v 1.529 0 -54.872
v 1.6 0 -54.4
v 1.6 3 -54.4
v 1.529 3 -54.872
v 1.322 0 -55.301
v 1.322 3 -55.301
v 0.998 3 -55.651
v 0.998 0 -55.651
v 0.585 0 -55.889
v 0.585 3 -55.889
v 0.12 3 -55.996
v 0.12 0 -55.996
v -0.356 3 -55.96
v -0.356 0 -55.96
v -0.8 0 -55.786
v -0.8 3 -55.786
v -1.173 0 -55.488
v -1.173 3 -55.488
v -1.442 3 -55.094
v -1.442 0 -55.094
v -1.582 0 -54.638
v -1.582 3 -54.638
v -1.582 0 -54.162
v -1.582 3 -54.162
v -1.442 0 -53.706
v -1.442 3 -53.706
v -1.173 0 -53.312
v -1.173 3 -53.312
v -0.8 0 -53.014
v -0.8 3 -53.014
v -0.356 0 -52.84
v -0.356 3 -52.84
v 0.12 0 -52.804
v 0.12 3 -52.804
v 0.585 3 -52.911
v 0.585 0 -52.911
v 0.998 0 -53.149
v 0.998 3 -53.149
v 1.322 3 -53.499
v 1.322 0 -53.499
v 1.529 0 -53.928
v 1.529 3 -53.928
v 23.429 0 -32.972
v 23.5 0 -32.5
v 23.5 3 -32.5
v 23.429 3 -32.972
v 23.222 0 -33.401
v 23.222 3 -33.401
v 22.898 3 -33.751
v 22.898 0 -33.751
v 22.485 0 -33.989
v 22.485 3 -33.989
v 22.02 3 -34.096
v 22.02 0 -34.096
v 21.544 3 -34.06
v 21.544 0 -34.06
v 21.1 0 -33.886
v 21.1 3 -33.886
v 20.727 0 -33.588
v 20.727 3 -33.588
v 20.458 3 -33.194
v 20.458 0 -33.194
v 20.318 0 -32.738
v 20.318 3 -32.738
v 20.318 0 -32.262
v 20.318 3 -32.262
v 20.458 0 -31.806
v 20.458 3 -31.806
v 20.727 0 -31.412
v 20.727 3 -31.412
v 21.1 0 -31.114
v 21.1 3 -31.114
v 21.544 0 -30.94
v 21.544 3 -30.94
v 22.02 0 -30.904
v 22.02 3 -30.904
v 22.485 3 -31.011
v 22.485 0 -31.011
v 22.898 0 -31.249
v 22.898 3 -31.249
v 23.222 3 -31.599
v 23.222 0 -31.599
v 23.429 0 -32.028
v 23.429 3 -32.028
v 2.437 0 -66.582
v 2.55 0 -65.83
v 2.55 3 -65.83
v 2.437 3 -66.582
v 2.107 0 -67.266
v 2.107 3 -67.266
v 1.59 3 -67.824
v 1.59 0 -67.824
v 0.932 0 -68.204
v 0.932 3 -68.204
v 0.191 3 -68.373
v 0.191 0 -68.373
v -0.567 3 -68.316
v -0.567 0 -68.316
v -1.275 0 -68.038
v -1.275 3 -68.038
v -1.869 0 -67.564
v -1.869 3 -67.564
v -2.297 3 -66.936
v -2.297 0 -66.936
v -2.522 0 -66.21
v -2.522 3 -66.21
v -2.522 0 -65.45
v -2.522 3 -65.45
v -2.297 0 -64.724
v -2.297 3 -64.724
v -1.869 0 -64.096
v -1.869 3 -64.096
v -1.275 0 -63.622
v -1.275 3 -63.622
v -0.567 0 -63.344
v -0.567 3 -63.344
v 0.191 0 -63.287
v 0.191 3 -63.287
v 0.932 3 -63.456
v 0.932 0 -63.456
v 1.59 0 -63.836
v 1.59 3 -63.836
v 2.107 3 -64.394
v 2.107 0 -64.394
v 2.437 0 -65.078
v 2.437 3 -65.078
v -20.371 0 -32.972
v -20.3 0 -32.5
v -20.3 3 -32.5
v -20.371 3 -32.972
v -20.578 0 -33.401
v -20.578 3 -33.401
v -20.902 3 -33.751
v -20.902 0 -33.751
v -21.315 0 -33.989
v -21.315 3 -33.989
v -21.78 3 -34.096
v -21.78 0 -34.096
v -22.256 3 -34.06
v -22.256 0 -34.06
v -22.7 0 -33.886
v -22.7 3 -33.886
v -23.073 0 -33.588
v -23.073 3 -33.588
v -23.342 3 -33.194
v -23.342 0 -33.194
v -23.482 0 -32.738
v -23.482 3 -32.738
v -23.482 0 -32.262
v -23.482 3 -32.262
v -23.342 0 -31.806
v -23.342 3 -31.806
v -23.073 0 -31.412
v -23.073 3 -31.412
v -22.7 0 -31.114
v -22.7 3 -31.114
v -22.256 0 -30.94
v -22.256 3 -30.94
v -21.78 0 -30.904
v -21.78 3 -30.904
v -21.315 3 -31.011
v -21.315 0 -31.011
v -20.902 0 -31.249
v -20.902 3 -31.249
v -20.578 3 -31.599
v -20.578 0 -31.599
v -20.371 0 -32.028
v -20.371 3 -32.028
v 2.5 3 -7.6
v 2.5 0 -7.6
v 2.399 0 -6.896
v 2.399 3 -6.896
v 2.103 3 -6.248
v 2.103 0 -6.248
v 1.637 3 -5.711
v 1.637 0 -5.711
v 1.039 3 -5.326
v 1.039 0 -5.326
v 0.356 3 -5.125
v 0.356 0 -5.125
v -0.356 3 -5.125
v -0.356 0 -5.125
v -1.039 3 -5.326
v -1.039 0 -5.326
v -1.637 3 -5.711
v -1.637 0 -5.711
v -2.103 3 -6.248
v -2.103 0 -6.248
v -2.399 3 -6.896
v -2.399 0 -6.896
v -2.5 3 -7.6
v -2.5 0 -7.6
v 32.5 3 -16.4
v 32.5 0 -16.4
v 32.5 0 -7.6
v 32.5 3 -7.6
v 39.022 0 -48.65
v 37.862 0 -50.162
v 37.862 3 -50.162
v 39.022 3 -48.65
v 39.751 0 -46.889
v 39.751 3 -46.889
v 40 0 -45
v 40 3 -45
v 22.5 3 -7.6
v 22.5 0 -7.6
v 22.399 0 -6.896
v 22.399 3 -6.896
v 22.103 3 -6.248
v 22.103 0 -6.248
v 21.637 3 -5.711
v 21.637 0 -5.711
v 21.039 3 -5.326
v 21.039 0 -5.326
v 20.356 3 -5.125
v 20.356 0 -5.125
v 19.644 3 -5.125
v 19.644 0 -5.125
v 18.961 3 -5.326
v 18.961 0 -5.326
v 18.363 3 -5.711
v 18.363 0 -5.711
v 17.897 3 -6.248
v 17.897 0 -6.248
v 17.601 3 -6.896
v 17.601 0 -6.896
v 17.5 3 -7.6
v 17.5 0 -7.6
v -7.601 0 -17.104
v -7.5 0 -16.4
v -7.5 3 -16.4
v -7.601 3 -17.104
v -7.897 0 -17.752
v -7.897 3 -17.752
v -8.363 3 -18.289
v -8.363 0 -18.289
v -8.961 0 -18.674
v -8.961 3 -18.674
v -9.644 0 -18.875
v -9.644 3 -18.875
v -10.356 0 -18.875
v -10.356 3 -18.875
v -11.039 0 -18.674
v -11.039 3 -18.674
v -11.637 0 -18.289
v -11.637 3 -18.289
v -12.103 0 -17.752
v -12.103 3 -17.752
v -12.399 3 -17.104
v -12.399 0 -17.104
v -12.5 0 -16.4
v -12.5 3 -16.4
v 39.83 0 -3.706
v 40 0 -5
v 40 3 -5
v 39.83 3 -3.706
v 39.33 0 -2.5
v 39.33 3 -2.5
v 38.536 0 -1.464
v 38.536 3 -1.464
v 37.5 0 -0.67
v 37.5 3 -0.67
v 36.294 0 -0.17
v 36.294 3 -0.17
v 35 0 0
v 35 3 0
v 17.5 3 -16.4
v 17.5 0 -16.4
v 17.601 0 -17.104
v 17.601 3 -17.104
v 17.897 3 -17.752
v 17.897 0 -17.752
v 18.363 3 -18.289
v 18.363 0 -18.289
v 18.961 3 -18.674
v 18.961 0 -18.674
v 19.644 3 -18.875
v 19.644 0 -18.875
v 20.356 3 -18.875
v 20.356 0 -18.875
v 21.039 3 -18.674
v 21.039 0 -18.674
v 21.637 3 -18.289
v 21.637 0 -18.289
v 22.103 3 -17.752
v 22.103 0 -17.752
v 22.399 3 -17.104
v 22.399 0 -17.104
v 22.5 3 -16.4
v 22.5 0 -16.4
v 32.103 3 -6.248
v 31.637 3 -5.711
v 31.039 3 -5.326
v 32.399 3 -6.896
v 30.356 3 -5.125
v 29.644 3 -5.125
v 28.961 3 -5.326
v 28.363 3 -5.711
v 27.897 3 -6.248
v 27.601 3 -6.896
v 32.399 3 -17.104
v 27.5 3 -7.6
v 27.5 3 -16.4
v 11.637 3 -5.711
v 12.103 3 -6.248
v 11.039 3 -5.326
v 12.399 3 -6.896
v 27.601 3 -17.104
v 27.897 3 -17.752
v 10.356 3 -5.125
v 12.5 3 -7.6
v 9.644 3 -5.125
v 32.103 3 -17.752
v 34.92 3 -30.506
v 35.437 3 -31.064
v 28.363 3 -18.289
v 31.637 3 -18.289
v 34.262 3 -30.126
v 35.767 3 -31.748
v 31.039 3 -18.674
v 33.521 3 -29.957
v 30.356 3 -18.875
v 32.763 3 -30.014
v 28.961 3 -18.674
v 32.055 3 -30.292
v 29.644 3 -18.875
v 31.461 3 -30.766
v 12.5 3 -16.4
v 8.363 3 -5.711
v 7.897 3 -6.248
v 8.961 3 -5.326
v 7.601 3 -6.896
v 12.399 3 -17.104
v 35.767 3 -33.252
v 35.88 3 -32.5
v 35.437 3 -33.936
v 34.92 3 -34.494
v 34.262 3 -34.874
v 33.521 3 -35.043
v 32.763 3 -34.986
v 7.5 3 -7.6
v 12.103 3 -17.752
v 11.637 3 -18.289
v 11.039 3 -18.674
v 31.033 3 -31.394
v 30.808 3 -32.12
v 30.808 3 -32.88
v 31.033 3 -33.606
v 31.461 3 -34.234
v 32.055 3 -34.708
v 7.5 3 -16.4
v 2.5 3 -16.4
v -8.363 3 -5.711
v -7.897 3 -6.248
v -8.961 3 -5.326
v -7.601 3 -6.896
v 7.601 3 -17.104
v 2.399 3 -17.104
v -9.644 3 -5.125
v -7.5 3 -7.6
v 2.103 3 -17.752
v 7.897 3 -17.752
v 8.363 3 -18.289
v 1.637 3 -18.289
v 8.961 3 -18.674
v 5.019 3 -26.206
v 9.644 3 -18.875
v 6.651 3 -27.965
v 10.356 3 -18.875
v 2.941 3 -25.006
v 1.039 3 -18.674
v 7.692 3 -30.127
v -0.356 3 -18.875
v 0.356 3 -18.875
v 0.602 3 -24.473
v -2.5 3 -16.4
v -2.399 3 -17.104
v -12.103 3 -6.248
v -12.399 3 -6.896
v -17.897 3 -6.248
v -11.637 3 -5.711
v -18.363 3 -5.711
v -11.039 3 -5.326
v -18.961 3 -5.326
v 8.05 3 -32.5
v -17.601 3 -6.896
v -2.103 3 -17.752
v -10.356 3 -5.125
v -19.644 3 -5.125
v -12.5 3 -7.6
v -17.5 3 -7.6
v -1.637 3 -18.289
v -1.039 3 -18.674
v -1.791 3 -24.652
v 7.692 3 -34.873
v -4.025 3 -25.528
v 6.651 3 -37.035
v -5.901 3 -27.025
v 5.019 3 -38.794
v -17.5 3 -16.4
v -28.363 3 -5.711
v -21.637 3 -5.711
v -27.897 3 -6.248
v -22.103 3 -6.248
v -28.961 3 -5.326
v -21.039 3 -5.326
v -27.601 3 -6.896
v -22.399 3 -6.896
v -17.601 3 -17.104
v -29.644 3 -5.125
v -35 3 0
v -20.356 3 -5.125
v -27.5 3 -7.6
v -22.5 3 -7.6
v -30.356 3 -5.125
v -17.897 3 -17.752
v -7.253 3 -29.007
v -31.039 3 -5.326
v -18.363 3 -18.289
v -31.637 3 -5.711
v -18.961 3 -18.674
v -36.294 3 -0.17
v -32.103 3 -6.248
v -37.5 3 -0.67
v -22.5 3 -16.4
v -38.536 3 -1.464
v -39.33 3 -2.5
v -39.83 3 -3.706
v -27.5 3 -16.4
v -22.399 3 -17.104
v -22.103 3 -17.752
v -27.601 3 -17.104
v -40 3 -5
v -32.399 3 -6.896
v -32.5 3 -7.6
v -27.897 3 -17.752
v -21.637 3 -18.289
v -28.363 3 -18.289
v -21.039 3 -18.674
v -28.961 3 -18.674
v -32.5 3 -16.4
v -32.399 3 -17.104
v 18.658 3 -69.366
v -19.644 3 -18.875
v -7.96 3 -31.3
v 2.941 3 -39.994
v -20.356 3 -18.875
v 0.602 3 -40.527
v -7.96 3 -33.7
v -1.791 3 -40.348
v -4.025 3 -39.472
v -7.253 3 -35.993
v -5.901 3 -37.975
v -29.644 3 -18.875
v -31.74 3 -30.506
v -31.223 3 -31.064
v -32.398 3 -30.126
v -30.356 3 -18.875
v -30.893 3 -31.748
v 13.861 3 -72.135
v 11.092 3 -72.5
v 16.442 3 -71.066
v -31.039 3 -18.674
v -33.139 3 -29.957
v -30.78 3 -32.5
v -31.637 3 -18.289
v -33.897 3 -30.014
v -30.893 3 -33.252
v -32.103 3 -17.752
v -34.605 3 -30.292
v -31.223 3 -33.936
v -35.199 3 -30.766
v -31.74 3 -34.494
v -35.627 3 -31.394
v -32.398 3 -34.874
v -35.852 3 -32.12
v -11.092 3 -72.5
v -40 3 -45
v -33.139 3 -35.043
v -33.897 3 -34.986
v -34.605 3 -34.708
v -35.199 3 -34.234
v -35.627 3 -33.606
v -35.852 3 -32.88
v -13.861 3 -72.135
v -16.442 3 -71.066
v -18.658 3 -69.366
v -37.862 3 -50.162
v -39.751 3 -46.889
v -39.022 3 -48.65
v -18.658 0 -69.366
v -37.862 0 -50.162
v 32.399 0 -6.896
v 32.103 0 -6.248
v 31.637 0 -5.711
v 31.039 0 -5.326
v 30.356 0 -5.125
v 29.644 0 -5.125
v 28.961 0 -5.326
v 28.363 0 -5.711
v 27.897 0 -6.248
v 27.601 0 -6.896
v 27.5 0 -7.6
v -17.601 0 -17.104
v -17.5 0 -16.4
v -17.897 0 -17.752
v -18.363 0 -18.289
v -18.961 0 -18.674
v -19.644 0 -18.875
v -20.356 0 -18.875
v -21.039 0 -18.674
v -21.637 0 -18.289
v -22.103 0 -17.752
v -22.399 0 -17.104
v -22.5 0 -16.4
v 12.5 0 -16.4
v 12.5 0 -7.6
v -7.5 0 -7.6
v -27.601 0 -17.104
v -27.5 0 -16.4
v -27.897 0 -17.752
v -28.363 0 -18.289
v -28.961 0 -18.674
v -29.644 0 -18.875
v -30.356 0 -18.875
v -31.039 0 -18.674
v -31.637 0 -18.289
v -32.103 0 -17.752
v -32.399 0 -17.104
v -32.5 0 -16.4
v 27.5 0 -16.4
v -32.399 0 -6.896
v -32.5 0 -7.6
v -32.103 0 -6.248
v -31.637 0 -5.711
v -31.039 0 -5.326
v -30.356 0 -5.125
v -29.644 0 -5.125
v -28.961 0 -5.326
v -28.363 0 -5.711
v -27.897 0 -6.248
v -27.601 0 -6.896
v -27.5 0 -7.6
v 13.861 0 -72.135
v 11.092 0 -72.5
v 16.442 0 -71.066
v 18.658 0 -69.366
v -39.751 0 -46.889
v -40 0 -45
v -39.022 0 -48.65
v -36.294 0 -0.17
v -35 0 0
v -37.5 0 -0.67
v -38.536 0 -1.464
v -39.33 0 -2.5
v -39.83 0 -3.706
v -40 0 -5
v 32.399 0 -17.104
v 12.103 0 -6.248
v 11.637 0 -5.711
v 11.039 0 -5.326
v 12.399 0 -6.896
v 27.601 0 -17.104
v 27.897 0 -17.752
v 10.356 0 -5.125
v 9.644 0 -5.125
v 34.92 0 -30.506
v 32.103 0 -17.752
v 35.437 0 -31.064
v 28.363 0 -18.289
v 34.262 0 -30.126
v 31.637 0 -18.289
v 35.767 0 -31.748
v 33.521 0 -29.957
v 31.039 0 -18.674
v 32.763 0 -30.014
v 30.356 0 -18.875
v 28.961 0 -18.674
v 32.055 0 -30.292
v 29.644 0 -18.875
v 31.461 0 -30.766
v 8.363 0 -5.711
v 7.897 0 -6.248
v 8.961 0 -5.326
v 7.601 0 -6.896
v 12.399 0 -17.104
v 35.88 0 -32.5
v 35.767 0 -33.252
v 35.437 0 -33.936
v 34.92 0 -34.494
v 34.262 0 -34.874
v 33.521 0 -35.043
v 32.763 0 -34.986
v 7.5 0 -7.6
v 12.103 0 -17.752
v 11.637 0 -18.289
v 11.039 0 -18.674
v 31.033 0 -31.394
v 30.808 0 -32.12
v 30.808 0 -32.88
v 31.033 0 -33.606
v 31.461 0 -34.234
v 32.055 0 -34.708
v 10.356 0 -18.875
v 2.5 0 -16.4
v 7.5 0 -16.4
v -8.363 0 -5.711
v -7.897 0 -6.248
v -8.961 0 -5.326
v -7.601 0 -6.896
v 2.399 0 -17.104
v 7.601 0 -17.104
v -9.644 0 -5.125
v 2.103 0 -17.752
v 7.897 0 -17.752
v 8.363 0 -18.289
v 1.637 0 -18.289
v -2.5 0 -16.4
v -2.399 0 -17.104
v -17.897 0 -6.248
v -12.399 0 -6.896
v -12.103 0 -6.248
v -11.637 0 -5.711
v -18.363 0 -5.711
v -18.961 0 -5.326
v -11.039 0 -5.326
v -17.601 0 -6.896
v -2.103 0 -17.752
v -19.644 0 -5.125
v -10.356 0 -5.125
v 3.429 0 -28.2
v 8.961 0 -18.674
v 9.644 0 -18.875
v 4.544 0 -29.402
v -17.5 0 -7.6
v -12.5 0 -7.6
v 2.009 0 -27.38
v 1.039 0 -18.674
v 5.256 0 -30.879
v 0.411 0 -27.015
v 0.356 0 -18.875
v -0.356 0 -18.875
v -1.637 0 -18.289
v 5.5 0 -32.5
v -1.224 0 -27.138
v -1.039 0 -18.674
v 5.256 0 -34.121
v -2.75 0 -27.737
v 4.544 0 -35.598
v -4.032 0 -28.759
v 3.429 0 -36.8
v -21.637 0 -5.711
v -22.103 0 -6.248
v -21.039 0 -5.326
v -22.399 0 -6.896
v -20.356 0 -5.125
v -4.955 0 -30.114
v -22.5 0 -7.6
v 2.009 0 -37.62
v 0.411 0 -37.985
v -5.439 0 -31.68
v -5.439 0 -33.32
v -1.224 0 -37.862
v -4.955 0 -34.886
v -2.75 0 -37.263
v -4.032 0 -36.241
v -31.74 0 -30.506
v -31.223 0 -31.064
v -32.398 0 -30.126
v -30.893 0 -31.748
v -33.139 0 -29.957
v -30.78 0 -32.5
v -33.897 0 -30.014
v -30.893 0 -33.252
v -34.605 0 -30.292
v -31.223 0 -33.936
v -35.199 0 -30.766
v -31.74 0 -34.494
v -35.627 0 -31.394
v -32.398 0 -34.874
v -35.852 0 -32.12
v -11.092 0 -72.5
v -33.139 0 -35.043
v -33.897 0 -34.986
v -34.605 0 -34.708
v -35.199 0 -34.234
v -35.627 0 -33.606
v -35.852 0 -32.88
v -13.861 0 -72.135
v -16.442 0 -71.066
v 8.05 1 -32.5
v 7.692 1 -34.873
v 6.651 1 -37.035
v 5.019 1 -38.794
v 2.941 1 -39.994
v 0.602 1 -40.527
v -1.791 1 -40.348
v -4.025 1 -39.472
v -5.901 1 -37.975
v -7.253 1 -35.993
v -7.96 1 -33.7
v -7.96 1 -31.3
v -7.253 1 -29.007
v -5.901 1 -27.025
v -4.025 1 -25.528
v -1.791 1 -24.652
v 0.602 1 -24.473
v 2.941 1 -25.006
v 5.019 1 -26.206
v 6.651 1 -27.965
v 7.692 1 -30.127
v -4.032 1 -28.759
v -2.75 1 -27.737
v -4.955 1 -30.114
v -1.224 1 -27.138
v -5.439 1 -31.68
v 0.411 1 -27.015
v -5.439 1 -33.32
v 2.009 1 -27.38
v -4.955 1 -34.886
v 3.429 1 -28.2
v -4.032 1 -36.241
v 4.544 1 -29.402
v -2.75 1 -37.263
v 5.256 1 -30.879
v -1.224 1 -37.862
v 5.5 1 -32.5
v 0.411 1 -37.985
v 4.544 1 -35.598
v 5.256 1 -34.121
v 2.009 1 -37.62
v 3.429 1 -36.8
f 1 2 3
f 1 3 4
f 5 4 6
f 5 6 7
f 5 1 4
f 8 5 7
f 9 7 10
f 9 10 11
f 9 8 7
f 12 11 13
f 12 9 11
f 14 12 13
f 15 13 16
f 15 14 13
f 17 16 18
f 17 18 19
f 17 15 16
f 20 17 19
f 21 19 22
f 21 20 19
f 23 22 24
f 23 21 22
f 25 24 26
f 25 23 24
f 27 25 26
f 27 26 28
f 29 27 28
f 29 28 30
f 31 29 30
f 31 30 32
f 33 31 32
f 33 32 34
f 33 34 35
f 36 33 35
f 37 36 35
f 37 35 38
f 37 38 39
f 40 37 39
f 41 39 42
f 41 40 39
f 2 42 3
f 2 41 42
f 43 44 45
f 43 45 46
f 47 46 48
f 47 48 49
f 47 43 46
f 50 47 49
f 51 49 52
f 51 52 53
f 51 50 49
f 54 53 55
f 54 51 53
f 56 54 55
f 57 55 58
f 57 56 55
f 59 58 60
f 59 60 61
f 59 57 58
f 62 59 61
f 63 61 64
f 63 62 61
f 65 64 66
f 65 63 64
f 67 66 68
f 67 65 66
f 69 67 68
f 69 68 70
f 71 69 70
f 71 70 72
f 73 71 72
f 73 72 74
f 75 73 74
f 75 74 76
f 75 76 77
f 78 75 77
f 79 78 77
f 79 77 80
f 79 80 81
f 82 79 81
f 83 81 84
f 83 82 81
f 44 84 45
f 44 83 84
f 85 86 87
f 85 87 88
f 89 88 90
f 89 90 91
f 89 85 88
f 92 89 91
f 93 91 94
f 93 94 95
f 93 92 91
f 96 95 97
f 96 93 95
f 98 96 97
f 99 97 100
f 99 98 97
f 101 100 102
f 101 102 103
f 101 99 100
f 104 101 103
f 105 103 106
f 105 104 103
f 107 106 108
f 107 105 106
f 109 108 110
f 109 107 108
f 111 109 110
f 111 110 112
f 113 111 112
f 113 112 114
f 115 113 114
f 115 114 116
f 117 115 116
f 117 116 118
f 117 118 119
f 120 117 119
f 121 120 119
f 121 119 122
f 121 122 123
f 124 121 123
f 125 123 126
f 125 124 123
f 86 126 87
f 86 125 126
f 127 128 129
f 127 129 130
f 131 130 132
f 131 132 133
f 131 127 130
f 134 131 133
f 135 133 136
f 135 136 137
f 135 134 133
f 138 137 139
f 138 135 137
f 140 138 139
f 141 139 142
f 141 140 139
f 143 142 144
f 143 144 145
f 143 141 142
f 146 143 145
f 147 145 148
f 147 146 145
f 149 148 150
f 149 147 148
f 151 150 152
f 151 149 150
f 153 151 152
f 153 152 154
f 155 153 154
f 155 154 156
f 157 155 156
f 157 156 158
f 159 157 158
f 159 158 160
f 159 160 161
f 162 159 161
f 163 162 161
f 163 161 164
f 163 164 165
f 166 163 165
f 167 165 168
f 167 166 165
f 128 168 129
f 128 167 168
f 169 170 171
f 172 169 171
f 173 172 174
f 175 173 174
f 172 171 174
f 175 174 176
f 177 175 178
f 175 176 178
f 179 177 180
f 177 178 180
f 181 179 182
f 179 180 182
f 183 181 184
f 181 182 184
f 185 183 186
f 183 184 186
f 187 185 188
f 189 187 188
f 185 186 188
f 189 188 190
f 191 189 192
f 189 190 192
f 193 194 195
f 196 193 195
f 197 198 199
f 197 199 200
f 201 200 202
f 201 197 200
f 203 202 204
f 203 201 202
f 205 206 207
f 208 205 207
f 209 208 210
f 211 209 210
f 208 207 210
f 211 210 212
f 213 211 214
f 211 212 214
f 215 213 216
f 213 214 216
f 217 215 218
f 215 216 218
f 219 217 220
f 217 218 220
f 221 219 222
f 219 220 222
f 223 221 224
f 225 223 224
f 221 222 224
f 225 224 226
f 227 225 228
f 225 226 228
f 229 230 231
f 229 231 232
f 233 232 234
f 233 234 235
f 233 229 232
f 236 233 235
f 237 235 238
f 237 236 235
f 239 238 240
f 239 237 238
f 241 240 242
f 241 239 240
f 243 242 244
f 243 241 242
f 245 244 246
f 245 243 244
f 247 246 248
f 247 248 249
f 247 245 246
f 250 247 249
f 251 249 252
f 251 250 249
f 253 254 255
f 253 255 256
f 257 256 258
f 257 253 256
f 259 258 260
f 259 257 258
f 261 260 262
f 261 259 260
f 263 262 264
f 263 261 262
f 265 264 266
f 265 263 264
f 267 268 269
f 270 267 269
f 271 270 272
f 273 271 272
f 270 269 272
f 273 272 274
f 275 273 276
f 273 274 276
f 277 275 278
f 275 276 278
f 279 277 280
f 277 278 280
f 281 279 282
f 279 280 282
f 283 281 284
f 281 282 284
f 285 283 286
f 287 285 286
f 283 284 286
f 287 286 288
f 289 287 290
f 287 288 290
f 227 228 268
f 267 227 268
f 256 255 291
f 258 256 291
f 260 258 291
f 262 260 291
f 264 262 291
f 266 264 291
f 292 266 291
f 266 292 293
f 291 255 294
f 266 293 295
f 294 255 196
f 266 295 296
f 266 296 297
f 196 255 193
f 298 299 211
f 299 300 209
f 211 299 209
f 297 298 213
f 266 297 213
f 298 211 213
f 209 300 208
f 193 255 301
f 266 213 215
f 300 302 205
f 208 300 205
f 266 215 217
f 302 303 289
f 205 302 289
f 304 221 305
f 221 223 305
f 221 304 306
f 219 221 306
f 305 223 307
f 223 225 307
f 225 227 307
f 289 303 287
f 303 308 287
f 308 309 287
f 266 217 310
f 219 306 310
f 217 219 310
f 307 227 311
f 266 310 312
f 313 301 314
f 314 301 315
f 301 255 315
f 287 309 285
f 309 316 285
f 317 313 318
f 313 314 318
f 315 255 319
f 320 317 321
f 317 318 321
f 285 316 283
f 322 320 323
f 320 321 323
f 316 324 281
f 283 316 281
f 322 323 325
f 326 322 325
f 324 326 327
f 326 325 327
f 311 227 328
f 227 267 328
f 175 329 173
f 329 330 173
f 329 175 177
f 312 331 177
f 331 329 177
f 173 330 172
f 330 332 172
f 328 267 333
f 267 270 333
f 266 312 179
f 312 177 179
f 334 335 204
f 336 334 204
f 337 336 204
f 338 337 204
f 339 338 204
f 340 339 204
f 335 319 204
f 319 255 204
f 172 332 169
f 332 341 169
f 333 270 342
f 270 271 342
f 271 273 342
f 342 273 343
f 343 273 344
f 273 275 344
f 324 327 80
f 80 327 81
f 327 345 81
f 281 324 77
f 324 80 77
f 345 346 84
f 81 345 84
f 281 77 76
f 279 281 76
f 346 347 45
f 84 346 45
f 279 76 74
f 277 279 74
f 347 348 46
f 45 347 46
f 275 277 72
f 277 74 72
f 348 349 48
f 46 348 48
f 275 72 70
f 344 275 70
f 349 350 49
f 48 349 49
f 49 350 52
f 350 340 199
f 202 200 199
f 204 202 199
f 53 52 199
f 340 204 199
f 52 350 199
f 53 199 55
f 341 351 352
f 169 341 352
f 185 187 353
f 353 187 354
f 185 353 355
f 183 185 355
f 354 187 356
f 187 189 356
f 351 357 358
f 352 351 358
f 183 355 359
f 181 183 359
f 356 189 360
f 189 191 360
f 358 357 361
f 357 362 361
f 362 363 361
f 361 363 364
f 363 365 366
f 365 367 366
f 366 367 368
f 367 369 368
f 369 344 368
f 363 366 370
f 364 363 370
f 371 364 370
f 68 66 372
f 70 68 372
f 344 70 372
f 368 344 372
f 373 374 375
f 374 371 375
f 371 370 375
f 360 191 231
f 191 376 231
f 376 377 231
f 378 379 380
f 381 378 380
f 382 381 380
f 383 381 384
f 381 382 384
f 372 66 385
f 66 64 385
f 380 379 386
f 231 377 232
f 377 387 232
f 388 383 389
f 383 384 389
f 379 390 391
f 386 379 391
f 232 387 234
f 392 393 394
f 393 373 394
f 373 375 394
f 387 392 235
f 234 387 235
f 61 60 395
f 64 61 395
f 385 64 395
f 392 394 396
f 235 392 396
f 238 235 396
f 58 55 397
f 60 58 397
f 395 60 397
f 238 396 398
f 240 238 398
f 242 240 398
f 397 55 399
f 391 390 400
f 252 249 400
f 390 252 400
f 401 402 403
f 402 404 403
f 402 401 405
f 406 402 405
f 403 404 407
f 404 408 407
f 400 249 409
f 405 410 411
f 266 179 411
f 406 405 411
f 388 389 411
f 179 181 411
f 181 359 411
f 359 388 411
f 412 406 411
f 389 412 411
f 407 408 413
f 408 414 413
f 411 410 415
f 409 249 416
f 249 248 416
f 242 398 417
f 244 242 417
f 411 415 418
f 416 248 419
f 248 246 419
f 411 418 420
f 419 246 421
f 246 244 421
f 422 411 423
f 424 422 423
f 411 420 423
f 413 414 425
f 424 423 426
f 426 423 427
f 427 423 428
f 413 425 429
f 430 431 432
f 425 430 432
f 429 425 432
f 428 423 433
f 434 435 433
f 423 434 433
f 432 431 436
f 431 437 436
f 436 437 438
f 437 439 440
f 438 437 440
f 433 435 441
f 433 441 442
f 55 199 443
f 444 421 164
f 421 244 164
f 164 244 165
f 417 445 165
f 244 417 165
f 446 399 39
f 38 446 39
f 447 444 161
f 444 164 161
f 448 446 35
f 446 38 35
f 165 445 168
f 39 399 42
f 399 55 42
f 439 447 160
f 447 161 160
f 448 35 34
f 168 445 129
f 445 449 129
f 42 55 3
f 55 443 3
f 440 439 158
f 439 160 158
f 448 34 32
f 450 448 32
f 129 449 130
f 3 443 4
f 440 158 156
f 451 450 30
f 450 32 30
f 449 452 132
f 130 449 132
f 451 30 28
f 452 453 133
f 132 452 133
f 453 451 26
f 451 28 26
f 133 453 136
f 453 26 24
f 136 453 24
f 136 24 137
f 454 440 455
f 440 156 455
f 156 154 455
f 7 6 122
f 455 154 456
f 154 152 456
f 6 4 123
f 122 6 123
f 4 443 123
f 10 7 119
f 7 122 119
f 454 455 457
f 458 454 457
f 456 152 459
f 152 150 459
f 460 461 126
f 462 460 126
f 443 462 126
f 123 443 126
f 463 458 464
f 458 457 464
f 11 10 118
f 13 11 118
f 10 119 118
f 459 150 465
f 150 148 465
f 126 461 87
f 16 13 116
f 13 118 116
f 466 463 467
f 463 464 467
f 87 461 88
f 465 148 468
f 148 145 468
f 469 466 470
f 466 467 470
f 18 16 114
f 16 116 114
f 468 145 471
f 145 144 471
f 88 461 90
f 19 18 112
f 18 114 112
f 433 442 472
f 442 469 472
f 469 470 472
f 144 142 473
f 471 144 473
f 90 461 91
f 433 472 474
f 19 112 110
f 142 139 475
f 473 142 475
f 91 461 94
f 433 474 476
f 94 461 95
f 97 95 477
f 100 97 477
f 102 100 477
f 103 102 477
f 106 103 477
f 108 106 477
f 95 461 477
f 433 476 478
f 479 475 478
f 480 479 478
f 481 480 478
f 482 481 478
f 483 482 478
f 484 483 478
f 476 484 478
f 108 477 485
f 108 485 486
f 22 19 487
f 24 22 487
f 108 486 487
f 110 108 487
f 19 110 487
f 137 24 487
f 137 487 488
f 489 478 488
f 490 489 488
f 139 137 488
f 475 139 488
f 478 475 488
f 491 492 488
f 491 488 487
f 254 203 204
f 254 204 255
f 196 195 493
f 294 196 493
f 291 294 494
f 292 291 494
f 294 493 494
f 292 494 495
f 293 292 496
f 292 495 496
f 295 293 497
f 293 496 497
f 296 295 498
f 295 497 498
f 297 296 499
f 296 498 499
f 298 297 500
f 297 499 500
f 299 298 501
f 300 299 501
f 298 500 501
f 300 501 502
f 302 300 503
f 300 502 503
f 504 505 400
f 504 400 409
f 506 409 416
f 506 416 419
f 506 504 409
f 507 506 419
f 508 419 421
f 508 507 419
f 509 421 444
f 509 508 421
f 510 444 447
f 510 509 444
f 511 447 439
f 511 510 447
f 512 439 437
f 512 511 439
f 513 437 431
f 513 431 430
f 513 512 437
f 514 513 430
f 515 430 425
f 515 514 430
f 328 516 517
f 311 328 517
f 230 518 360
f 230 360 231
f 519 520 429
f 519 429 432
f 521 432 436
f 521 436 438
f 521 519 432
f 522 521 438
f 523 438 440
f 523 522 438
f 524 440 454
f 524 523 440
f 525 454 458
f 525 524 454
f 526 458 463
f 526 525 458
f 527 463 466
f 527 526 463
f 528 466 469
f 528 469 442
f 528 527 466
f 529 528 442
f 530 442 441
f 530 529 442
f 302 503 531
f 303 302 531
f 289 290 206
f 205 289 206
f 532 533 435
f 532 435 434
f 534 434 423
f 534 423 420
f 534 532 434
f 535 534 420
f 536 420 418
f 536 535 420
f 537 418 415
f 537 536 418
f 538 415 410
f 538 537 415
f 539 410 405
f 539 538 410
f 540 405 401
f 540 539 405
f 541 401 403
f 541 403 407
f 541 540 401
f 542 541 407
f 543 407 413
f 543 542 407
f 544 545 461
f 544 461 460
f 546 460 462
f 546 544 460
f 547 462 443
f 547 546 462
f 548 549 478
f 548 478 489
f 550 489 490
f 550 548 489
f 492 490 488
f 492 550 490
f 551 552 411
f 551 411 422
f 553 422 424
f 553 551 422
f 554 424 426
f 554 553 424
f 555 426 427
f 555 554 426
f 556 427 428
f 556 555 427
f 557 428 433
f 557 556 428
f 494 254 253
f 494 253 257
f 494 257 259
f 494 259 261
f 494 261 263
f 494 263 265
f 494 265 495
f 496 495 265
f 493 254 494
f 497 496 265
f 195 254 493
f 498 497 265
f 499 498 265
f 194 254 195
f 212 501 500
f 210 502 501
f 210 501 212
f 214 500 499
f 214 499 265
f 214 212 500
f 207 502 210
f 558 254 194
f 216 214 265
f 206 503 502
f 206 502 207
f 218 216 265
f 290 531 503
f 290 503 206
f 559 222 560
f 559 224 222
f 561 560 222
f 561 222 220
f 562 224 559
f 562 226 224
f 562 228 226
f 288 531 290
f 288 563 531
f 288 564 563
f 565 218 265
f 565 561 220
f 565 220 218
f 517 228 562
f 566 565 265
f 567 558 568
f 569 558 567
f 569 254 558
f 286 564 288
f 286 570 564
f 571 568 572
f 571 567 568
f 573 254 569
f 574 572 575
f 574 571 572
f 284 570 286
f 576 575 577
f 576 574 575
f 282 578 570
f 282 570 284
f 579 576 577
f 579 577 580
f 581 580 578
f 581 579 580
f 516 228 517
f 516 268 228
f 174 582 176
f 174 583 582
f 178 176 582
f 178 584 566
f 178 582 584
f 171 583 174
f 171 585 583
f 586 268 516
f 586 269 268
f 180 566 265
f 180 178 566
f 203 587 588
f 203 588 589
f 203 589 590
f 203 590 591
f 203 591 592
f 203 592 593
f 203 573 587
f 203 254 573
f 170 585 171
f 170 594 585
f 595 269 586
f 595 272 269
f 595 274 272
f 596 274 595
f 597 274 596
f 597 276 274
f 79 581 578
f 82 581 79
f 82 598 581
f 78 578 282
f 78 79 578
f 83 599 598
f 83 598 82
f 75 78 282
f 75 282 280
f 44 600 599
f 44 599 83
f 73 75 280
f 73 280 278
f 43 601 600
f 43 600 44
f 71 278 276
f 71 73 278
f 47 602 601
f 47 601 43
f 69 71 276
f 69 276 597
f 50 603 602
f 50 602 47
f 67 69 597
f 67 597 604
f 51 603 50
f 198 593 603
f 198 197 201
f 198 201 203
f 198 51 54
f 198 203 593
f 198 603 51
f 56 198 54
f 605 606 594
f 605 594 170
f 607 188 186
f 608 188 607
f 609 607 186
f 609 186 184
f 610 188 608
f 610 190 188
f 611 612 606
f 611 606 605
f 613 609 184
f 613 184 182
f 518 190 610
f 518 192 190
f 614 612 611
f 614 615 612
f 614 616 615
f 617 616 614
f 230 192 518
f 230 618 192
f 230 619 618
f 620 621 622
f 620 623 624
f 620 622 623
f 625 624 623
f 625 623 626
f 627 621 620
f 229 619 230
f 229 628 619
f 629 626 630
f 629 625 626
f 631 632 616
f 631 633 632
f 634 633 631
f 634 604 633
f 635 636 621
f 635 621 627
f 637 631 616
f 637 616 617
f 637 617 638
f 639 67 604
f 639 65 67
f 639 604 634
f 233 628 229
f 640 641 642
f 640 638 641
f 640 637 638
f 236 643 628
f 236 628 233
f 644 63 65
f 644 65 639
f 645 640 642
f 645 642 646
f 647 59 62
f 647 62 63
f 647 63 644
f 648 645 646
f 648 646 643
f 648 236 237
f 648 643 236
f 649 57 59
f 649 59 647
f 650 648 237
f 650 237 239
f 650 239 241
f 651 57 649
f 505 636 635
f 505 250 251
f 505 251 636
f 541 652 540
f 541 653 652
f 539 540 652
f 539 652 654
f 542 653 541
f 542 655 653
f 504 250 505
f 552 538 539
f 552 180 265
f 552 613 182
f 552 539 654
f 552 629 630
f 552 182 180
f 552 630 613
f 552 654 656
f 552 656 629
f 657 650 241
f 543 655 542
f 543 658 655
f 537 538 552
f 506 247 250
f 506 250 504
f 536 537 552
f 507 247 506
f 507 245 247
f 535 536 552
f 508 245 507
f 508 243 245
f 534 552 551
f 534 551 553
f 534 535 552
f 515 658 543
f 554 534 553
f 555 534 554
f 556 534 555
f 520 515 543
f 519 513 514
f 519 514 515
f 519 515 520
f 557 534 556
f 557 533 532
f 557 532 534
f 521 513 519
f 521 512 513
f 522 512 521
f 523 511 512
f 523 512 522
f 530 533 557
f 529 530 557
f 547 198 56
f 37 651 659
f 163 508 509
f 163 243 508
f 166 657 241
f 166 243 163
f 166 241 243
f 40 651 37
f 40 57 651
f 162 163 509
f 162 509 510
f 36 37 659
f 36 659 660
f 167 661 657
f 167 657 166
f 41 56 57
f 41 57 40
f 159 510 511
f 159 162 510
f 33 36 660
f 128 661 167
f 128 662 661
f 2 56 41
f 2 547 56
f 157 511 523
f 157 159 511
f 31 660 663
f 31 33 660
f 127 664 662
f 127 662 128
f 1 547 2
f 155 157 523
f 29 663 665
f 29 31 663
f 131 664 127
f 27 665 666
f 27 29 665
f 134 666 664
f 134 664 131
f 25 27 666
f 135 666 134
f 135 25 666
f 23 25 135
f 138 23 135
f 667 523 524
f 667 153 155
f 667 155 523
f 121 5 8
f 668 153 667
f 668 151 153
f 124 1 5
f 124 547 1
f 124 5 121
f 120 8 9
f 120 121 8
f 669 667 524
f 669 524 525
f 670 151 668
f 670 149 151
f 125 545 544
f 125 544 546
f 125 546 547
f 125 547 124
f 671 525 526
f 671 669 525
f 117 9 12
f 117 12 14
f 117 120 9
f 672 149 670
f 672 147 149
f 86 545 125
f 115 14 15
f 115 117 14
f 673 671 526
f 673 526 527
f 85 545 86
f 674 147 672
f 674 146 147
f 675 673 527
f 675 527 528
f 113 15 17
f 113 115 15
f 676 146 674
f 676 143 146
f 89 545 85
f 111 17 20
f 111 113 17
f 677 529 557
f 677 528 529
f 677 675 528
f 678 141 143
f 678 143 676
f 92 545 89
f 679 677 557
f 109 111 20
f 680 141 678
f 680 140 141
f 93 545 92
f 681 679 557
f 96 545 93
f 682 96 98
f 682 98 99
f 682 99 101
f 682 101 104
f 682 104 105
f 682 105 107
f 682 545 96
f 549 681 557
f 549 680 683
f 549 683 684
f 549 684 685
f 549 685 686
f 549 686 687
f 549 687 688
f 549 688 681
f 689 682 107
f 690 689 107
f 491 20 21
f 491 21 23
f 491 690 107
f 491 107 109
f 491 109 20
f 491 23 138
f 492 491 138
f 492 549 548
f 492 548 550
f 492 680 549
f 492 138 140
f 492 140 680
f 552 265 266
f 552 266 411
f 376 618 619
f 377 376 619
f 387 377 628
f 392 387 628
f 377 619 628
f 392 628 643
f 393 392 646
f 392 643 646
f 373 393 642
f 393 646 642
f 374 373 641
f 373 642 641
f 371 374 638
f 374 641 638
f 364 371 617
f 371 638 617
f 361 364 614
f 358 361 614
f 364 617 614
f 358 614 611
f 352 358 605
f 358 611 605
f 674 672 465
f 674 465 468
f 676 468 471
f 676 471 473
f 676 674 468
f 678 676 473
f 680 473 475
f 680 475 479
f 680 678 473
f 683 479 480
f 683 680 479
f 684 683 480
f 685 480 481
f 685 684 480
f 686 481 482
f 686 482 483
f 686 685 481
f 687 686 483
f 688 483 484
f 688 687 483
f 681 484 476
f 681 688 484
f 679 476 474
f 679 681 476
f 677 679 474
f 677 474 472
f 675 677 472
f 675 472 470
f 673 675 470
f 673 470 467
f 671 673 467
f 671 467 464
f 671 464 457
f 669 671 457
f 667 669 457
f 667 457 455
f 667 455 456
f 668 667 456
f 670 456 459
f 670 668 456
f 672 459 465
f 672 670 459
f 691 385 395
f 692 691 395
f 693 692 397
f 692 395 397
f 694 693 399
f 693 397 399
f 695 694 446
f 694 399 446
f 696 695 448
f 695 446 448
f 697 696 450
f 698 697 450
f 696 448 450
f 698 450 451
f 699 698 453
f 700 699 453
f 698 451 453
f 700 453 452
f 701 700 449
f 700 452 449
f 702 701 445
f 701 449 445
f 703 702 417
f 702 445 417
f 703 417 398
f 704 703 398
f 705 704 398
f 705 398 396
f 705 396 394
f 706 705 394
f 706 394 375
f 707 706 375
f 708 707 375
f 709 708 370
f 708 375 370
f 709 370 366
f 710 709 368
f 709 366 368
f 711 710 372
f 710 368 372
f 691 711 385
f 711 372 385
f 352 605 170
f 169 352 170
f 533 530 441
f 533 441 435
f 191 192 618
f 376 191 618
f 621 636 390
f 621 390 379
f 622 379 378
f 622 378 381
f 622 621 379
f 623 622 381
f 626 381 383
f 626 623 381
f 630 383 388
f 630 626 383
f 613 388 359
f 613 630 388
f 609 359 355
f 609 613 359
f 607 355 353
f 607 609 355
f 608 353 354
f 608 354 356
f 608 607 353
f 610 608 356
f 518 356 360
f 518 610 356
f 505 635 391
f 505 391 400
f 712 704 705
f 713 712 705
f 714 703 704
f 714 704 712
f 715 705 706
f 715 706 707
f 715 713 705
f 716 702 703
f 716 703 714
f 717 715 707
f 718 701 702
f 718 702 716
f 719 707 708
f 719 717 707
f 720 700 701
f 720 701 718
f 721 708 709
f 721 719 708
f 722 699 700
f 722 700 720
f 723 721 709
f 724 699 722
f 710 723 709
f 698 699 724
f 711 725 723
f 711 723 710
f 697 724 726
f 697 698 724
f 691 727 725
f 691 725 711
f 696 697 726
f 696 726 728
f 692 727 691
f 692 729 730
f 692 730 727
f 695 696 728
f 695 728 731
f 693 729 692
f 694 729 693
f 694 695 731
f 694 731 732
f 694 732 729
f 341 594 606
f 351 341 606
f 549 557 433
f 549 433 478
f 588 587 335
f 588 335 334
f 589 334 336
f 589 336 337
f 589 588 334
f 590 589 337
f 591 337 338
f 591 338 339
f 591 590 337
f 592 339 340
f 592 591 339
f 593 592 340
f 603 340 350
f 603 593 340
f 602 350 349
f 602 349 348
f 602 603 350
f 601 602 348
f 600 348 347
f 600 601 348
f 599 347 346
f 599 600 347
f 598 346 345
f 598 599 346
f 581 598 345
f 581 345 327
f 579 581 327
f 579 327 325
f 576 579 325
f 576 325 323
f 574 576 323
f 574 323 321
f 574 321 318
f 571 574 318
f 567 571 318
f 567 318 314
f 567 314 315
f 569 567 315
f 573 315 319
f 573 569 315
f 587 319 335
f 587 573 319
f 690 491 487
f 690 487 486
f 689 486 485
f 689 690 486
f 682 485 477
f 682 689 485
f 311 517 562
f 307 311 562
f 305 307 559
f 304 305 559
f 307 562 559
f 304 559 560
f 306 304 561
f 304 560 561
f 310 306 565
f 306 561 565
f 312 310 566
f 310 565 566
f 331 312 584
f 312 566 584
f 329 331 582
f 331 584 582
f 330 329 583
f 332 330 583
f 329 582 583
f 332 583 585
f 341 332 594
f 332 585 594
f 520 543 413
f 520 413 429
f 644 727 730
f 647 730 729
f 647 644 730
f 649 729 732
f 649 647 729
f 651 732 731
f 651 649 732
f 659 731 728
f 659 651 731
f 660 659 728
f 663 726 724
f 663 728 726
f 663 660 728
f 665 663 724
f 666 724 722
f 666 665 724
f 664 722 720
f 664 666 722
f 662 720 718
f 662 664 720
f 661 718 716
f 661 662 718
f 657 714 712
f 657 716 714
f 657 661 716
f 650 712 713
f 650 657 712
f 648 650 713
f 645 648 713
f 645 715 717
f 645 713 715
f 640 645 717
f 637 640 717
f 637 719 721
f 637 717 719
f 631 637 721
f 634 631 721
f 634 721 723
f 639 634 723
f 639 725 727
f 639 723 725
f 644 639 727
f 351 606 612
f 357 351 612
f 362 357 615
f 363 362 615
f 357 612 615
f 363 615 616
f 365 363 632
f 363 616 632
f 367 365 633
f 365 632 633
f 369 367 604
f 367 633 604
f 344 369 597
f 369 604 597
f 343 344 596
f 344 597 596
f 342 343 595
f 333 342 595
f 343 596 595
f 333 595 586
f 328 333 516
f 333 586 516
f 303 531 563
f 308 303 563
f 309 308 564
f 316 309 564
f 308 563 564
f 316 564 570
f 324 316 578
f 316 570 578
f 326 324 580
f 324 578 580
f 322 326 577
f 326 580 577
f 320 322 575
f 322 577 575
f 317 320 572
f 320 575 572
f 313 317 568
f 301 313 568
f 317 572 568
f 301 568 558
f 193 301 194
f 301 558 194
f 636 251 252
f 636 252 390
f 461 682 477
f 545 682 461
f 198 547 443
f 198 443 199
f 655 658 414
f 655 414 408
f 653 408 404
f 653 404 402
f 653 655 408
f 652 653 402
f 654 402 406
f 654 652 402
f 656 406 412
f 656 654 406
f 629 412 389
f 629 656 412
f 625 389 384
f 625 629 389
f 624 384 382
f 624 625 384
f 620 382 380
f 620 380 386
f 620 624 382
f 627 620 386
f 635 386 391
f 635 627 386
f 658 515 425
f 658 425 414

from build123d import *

# Parameters (mm, degrees)
SKETCH1_R           = 5.5
SKETCH1_R_2         = 2.55
SKETCH1_R_3         = 1.6
BOSS_EXTRUDE1_DEPTH = 3
SKETCH2_R           = 8.05
CUT_EXTRUDE1_DEPTH  = 2


with BuildPart() as part:
    # Sketch1 → Boss-Extrude1 (new body)
    with BuildSketch(Plane(origin=(0, 0, 0), x_dir=(1, 0, 0), z_dir=(0, 1, 0))):
        with BuildLine():
            Line((-37.861879503, 50.161879503), (-18.657716447, 69.366042559))
            ThreePointArc((-18.657716447, 69.366042559), (-15.186386614, 71.685510998), (-11.091673888, 72.5))
            Line((-11.091673888, 72.5), (11.091673888, 72.5))
            ThreePointArc((11.091673888, 72.5), (15.186386614, 71.685510998), (18.657716447, 69.366042559))
            Line((18.657716447, 69.366042559), (37.861879503, 50.161879503))
            ThreePointArc((37.861879503, 50.161879503), (39.444320587, 47.793589056), (40, 45))
            Line((40, 45), (40, 5))
            ThreePointArc((40, 5), (38.535533906, 1.464466094), (35, 0))
            Line((35, 0), (-35, 0))
            ThreePointArc((-35, 0), (-38.535533906, 1.464466094), (-40, 5))
            Line((-40, 5), (-40, 45))
            ThreePointArc((-40, 45), (-39.444320587, 47.793589056), (-37.861879503, 50.161879503))
        make_face()
        with Locations((0, 32.5)):
            Circle(SKETCH1_R, mode=Mode.SUBTRACT)
        with Locations((0, 65.83)):
            Circle(SKETCH1_R_2, mode=Mode.SUBTRACT)
        with Locations((0, 54.4)):
            Circle(SKETCH1_R_3, mode=Mode.SUBTRACT)
        with Locations((-33.33, 32.5)):
            Circle(SKETCH1_R_2, mode=Mode.SUBTRACT)
        with Locations((-21.9, 32.5)):
            Circle(SKETCH1_R_3, mode=Mode.SUBTRACT)
        with Locations((33.33, 32.5)):
            Circle(SKETCH1_R_2, mode=Mode.SUBTRACT)
        with Locations((21.9, 32.5)):
            Circle(SKETCH1_R_3, mode=Mode.SUBTRACT)
        with BuildLine():
            Line((-2.5, 7.6), (-2.5, 16.4))
            ThreePointArc((-2.5, 16.4), (0, 18.9), (2.5, 16.4))
            Line((2.5, 16.4), (2.5, 7.6))
            ThreePointArc((2.5, 7.6), (0, 5.1), (-2.5, 7.6))
        make_face(mode=Mode.SUBTRACT)
        with BuildLine():
            Line((7.5, 7.6), (7.5, 16.4))
            ThreePointArc((7.5, 16.4), (10, 18.9), (12.5, 16.4))
            Line((12.5, 16.4), (12.5, 7.6))
            ThreePointArc((12.5, 7.6), (10, 5.1), (7.5, 7.6))
        make_face(mode=Mode.SUBTRACT)
        with BuildLine():
            Line((17.5, 7.6), (17.5, 16.4))
            ThreePointArc((17.5, 16.4), (20, 18.9), (22.5, 16.4))
            Line((22.5, 16.4), (22.5, 7.6))
            ThreePointArc((22.5, 7.6), (20, 5.1), (17.5, 7.6))
        make_face(mode=Mode.SUBTRACT)
        with BuildLine():
            Line((27.5, 7.6), (27.5, 16.4))
            ThreePointArc((27.5, 16.4), (30, 18.9), (32.5, 16.4))
            Line((32.5, 16.4), (32.5, 7.6))
            ThreePointArc((32.5, 7.6), (30, 5.1), (27.5, 7.6))
        make_face(mode=Mode.SUBTRACT)
        with BuildLine():
            Line((-7.5, 7.6), (-7.5, 16.4))
            ThreePointArc((-7.5, 16.4), (-10, 18.9), (-12.5, 16.4))
            Line((-12.5, 16.4), (-12.5, 7.6))
            ThreePointArc((-12.5, 7.6), (-10, 5.1), (-7.5, 7.6))
        make_face(mode=Mode.SUBTRACT)
        with BuildLine():
            Line((-17.5, 7.6), (-17.5, 16.4))
            ThreePointArc((-17.5, 16.4), (-20, 18.9), (-22.5, 16.4))
            Line((-22.5, 16.4), (-22.5, 7.6))
            ThreePointArc((-22.5, 7.6), (-20, 5.1), (-17.5, 7.6))
        make_face(mode=Mode.SUBTRACT)
        with BuildLine():
            Line((-27.5, 7.6), (-27.5, 16.4))
            ThreePointArc((-27.5, 16.4), (-30, 18.9), (-32.5, 16.4))
            Line((-32.5, 16.4), (-32.5, 7.6))
            ThreePointArc((-32.5, 7.6), (-30, 5.1), (-27.5, 7.6))
        make_face(mode=Mode.SUBTRACT)
    extrude(amount=BOSS_EXTRUDE1_DEPTH)

    # Sketch2 → Cut-Extrude1 (cut)
    with BuildSketch(Plane(origin=(0, 3, 0), x_dir=(1, 0, 0), z_dir=(0, 1, 0))):
        with Locations((0, 32.5)):
            Circle(SKETCH2_R)
    extrude(amount=-CUT_EXTRUDE1_DEPTH, mode=Mode.SUBTRACT)


solid = part.part
